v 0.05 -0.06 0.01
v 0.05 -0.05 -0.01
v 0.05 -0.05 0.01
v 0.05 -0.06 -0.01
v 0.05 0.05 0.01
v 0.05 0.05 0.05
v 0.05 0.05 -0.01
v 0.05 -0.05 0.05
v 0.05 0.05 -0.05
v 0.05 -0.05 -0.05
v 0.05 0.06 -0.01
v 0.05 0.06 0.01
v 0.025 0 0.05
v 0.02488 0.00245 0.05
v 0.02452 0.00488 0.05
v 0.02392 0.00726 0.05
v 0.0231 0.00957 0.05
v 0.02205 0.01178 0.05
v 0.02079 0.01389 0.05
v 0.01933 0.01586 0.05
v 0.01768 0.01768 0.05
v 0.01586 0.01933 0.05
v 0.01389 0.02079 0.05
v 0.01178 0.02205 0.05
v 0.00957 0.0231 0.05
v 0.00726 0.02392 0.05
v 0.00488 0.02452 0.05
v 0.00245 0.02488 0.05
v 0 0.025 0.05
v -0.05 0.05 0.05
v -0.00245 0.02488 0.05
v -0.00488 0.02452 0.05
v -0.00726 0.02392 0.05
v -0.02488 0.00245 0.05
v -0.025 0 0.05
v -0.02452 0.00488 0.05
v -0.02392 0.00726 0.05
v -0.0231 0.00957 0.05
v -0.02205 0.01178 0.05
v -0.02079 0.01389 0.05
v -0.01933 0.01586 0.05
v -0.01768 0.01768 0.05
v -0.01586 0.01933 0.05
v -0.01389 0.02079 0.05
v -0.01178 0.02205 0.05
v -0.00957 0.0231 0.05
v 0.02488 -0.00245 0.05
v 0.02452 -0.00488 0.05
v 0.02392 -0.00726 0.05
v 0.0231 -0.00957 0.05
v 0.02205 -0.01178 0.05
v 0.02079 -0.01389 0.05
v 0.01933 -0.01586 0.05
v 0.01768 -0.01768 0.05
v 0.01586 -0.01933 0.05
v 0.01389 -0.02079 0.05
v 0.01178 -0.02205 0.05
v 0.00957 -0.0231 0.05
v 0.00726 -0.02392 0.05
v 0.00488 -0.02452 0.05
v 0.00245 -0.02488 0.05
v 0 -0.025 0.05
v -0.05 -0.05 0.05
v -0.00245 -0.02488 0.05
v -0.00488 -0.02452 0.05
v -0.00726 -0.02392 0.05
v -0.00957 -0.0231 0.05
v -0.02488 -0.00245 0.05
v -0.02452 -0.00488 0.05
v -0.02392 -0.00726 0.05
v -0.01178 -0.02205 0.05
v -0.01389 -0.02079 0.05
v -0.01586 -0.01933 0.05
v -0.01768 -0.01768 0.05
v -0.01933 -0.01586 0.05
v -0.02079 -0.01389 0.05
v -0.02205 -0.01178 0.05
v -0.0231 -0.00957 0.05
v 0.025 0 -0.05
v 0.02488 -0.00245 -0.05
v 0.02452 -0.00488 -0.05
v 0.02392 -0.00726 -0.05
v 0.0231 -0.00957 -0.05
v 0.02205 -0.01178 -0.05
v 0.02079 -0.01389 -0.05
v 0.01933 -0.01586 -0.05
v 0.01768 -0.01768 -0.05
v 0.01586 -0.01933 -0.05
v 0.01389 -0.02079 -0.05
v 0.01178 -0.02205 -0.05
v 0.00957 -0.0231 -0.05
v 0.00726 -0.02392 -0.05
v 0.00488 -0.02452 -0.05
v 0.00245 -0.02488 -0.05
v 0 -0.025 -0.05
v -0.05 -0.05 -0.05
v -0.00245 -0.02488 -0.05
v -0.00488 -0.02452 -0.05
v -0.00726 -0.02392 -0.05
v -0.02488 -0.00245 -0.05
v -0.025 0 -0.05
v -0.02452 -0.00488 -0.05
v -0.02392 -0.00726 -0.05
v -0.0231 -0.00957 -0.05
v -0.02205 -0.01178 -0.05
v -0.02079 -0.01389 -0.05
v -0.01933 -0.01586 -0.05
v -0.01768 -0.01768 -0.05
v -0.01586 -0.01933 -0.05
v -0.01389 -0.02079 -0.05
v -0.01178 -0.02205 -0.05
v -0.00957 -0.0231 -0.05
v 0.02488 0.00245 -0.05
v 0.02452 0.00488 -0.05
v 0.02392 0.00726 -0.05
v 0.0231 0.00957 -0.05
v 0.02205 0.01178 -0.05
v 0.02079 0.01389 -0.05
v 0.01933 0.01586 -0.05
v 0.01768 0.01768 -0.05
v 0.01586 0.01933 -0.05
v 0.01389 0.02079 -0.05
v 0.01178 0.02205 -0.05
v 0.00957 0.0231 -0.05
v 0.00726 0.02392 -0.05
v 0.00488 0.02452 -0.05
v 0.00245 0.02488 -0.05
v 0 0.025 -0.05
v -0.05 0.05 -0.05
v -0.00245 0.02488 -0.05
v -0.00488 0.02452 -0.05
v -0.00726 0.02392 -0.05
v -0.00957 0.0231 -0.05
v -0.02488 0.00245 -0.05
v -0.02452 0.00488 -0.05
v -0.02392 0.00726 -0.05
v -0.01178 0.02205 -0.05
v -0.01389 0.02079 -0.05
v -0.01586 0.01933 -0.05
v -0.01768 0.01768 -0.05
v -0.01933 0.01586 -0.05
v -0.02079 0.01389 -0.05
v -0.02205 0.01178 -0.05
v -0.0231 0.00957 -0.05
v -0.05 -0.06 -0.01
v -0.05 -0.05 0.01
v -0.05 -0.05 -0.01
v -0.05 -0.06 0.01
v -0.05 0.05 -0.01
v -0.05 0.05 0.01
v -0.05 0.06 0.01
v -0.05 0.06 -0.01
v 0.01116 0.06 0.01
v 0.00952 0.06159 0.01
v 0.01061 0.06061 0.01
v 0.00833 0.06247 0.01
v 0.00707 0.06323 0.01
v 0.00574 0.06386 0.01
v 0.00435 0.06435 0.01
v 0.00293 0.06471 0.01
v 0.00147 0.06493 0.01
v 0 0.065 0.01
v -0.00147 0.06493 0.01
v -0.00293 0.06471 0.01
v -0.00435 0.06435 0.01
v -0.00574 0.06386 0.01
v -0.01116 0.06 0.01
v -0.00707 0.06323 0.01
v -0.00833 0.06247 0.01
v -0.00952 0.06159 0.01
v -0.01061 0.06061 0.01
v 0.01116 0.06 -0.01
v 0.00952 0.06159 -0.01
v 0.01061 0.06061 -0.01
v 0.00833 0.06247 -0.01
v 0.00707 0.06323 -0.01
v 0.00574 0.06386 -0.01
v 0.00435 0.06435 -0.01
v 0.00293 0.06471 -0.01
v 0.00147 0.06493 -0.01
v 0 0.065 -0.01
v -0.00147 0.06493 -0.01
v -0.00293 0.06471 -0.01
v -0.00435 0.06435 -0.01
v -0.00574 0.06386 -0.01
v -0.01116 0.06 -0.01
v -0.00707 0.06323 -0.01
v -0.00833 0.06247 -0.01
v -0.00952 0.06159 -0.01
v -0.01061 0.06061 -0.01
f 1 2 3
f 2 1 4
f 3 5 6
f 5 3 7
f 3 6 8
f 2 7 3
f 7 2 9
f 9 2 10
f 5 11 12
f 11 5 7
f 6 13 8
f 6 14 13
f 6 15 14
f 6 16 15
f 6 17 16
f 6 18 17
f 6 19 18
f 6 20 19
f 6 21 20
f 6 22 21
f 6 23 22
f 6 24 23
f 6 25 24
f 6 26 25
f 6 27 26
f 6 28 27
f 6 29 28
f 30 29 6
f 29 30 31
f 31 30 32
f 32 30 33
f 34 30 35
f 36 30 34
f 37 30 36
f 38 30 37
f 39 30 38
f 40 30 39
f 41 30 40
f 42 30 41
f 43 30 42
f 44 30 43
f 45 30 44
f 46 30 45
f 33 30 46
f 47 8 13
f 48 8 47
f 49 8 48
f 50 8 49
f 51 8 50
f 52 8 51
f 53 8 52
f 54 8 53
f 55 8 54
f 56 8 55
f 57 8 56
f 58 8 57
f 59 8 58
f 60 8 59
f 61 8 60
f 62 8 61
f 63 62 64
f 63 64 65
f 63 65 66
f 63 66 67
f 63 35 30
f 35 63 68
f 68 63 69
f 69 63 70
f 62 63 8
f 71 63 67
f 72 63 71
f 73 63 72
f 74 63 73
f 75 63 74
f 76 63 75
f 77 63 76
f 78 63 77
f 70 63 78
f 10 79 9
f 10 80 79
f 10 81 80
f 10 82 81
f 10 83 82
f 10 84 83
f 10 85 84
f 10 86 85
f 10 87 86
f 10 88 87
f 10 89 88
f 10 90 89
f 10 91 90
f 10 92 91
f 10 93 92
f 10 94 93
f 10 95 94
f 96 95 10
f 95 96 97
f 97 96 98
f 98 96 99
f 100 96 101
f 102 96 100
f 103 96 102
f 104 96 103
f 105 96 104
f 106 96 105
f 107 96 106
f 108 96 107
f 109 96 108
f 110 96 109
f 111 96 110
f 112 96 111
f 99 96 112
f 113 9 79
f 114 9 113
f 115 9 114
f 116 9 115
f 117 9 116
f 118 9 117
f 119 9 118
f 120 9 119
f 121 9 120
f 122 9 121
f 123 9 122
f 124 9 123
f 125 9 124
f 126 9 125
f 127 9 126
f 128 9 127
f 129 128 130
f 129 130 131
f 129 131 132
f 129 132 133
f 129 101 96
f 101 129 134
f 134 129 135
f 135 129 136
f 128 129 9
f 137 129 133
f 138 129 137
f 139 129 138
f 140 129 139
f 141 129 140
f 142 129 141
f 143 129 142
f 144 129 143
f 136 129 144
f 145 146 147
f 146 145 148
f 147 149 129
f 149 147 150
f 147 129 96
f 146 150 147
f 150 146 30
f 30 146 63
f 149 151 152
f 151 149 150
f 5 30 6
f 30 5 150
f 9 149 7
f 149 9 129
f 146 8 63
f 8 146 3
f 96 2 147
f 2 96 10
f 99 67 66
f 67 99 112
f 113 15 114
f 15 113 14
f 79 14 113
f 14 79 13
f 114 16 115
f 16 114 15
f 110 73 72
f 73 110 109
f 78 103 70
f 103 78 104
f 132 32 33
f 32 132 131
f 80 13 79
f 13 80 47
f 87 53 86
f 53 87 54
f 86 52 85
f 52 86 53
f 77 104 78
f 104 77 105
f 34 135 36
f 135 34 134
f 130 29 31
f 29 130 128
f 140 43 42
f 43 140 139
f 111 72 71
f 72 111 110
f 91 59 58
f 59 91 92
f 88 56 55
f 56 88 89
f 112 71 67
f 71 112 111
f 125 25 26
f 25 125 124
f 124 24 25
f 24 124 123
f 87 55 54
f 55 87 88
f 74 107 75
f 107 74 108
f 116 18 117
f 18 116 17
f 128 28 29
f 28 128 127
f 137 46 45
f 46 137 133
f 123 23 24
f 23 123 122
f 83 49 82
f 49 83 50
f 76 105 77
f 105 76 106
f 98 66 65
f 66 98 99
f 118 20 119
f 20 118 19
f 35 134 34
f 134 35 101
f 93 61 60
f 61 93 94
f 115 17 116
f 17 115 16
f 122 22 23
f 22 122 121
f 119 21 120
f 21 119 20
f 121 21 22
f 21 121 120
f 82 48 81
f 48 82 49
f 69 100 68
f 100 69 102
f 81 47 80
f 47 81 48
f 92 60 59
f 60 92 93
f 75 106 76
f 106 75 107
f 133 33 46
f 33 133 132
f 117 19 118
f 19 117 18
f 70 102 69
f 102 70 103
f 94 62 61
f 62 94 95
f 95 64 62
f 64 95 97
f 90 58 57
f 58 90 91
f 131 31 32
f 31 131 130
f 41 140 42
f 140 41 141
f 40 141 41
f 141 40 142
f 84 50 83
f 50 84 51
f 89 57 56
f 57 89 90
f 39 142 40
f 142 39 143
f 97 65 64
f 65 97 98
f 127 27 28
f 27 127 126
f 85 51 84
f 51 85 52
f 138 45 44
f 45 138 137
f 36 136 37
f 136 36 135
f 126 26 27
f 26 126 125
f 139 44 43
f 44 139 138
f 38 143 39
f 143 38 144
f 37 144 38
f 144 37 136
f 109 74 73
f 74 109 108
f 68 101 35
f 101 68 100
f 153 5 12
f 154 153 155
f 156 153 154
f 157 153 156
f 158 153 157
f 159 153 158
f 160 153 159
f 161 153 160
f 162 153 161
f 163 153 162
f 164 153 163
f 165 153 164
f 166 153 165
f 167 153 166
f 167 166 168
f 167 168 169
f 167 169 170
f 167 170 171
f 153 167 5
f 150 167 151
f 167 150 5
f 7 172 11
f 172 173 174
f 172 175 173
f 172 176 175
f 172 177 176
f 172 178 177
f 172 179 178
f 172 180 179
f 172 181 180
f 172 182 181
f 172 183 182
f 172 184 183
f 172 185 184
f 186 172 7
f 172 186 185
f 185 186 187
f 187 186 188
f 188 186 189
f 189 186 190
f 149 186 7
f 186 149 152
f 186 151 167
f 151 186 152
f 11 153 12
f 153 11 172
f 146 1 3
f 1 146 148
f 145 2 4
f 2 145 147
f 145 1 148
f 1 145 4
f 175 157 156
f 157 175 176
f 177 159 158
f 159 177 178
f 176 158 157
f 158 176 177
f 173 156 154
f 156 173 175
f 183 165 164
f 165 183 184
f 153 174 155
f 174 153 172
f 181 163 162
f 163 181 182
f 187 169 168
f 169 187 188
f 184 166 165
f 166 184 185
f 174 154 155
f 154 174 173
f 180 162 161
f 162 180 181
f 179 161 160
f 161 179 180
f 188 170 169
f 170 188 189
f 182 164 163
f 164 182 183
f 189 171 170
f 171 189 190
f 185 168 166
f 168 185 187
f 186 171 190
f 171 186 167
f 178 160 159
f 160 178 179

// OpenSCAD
module housing() {
    difference() {
        // Main block
        cube([0.1, 0.1, 0.1], center=true);
        
        // Through-bore
        translate([0, 0, -0.05])
            cylinder(h=0.2, d=0.05, $fn=64, center=true);
    }
}

module boss() {
    translate([0, 0.05, 0])
        cylinder(h=0.02, d=0.03, $fn=64, center=true);
}

module tabs() {
    union() {
        // Top tab
        translate([0, 0.05, 0])
            cube([0.1, 0.02, 0.02], center=true);
        
        // Bottom tab
        translate([0, -0.05, 0])
            cube([0.1, 0.02, 0.02], center=true);
    }
}

union() {
    housing();
    boss();
    tabs();
}
